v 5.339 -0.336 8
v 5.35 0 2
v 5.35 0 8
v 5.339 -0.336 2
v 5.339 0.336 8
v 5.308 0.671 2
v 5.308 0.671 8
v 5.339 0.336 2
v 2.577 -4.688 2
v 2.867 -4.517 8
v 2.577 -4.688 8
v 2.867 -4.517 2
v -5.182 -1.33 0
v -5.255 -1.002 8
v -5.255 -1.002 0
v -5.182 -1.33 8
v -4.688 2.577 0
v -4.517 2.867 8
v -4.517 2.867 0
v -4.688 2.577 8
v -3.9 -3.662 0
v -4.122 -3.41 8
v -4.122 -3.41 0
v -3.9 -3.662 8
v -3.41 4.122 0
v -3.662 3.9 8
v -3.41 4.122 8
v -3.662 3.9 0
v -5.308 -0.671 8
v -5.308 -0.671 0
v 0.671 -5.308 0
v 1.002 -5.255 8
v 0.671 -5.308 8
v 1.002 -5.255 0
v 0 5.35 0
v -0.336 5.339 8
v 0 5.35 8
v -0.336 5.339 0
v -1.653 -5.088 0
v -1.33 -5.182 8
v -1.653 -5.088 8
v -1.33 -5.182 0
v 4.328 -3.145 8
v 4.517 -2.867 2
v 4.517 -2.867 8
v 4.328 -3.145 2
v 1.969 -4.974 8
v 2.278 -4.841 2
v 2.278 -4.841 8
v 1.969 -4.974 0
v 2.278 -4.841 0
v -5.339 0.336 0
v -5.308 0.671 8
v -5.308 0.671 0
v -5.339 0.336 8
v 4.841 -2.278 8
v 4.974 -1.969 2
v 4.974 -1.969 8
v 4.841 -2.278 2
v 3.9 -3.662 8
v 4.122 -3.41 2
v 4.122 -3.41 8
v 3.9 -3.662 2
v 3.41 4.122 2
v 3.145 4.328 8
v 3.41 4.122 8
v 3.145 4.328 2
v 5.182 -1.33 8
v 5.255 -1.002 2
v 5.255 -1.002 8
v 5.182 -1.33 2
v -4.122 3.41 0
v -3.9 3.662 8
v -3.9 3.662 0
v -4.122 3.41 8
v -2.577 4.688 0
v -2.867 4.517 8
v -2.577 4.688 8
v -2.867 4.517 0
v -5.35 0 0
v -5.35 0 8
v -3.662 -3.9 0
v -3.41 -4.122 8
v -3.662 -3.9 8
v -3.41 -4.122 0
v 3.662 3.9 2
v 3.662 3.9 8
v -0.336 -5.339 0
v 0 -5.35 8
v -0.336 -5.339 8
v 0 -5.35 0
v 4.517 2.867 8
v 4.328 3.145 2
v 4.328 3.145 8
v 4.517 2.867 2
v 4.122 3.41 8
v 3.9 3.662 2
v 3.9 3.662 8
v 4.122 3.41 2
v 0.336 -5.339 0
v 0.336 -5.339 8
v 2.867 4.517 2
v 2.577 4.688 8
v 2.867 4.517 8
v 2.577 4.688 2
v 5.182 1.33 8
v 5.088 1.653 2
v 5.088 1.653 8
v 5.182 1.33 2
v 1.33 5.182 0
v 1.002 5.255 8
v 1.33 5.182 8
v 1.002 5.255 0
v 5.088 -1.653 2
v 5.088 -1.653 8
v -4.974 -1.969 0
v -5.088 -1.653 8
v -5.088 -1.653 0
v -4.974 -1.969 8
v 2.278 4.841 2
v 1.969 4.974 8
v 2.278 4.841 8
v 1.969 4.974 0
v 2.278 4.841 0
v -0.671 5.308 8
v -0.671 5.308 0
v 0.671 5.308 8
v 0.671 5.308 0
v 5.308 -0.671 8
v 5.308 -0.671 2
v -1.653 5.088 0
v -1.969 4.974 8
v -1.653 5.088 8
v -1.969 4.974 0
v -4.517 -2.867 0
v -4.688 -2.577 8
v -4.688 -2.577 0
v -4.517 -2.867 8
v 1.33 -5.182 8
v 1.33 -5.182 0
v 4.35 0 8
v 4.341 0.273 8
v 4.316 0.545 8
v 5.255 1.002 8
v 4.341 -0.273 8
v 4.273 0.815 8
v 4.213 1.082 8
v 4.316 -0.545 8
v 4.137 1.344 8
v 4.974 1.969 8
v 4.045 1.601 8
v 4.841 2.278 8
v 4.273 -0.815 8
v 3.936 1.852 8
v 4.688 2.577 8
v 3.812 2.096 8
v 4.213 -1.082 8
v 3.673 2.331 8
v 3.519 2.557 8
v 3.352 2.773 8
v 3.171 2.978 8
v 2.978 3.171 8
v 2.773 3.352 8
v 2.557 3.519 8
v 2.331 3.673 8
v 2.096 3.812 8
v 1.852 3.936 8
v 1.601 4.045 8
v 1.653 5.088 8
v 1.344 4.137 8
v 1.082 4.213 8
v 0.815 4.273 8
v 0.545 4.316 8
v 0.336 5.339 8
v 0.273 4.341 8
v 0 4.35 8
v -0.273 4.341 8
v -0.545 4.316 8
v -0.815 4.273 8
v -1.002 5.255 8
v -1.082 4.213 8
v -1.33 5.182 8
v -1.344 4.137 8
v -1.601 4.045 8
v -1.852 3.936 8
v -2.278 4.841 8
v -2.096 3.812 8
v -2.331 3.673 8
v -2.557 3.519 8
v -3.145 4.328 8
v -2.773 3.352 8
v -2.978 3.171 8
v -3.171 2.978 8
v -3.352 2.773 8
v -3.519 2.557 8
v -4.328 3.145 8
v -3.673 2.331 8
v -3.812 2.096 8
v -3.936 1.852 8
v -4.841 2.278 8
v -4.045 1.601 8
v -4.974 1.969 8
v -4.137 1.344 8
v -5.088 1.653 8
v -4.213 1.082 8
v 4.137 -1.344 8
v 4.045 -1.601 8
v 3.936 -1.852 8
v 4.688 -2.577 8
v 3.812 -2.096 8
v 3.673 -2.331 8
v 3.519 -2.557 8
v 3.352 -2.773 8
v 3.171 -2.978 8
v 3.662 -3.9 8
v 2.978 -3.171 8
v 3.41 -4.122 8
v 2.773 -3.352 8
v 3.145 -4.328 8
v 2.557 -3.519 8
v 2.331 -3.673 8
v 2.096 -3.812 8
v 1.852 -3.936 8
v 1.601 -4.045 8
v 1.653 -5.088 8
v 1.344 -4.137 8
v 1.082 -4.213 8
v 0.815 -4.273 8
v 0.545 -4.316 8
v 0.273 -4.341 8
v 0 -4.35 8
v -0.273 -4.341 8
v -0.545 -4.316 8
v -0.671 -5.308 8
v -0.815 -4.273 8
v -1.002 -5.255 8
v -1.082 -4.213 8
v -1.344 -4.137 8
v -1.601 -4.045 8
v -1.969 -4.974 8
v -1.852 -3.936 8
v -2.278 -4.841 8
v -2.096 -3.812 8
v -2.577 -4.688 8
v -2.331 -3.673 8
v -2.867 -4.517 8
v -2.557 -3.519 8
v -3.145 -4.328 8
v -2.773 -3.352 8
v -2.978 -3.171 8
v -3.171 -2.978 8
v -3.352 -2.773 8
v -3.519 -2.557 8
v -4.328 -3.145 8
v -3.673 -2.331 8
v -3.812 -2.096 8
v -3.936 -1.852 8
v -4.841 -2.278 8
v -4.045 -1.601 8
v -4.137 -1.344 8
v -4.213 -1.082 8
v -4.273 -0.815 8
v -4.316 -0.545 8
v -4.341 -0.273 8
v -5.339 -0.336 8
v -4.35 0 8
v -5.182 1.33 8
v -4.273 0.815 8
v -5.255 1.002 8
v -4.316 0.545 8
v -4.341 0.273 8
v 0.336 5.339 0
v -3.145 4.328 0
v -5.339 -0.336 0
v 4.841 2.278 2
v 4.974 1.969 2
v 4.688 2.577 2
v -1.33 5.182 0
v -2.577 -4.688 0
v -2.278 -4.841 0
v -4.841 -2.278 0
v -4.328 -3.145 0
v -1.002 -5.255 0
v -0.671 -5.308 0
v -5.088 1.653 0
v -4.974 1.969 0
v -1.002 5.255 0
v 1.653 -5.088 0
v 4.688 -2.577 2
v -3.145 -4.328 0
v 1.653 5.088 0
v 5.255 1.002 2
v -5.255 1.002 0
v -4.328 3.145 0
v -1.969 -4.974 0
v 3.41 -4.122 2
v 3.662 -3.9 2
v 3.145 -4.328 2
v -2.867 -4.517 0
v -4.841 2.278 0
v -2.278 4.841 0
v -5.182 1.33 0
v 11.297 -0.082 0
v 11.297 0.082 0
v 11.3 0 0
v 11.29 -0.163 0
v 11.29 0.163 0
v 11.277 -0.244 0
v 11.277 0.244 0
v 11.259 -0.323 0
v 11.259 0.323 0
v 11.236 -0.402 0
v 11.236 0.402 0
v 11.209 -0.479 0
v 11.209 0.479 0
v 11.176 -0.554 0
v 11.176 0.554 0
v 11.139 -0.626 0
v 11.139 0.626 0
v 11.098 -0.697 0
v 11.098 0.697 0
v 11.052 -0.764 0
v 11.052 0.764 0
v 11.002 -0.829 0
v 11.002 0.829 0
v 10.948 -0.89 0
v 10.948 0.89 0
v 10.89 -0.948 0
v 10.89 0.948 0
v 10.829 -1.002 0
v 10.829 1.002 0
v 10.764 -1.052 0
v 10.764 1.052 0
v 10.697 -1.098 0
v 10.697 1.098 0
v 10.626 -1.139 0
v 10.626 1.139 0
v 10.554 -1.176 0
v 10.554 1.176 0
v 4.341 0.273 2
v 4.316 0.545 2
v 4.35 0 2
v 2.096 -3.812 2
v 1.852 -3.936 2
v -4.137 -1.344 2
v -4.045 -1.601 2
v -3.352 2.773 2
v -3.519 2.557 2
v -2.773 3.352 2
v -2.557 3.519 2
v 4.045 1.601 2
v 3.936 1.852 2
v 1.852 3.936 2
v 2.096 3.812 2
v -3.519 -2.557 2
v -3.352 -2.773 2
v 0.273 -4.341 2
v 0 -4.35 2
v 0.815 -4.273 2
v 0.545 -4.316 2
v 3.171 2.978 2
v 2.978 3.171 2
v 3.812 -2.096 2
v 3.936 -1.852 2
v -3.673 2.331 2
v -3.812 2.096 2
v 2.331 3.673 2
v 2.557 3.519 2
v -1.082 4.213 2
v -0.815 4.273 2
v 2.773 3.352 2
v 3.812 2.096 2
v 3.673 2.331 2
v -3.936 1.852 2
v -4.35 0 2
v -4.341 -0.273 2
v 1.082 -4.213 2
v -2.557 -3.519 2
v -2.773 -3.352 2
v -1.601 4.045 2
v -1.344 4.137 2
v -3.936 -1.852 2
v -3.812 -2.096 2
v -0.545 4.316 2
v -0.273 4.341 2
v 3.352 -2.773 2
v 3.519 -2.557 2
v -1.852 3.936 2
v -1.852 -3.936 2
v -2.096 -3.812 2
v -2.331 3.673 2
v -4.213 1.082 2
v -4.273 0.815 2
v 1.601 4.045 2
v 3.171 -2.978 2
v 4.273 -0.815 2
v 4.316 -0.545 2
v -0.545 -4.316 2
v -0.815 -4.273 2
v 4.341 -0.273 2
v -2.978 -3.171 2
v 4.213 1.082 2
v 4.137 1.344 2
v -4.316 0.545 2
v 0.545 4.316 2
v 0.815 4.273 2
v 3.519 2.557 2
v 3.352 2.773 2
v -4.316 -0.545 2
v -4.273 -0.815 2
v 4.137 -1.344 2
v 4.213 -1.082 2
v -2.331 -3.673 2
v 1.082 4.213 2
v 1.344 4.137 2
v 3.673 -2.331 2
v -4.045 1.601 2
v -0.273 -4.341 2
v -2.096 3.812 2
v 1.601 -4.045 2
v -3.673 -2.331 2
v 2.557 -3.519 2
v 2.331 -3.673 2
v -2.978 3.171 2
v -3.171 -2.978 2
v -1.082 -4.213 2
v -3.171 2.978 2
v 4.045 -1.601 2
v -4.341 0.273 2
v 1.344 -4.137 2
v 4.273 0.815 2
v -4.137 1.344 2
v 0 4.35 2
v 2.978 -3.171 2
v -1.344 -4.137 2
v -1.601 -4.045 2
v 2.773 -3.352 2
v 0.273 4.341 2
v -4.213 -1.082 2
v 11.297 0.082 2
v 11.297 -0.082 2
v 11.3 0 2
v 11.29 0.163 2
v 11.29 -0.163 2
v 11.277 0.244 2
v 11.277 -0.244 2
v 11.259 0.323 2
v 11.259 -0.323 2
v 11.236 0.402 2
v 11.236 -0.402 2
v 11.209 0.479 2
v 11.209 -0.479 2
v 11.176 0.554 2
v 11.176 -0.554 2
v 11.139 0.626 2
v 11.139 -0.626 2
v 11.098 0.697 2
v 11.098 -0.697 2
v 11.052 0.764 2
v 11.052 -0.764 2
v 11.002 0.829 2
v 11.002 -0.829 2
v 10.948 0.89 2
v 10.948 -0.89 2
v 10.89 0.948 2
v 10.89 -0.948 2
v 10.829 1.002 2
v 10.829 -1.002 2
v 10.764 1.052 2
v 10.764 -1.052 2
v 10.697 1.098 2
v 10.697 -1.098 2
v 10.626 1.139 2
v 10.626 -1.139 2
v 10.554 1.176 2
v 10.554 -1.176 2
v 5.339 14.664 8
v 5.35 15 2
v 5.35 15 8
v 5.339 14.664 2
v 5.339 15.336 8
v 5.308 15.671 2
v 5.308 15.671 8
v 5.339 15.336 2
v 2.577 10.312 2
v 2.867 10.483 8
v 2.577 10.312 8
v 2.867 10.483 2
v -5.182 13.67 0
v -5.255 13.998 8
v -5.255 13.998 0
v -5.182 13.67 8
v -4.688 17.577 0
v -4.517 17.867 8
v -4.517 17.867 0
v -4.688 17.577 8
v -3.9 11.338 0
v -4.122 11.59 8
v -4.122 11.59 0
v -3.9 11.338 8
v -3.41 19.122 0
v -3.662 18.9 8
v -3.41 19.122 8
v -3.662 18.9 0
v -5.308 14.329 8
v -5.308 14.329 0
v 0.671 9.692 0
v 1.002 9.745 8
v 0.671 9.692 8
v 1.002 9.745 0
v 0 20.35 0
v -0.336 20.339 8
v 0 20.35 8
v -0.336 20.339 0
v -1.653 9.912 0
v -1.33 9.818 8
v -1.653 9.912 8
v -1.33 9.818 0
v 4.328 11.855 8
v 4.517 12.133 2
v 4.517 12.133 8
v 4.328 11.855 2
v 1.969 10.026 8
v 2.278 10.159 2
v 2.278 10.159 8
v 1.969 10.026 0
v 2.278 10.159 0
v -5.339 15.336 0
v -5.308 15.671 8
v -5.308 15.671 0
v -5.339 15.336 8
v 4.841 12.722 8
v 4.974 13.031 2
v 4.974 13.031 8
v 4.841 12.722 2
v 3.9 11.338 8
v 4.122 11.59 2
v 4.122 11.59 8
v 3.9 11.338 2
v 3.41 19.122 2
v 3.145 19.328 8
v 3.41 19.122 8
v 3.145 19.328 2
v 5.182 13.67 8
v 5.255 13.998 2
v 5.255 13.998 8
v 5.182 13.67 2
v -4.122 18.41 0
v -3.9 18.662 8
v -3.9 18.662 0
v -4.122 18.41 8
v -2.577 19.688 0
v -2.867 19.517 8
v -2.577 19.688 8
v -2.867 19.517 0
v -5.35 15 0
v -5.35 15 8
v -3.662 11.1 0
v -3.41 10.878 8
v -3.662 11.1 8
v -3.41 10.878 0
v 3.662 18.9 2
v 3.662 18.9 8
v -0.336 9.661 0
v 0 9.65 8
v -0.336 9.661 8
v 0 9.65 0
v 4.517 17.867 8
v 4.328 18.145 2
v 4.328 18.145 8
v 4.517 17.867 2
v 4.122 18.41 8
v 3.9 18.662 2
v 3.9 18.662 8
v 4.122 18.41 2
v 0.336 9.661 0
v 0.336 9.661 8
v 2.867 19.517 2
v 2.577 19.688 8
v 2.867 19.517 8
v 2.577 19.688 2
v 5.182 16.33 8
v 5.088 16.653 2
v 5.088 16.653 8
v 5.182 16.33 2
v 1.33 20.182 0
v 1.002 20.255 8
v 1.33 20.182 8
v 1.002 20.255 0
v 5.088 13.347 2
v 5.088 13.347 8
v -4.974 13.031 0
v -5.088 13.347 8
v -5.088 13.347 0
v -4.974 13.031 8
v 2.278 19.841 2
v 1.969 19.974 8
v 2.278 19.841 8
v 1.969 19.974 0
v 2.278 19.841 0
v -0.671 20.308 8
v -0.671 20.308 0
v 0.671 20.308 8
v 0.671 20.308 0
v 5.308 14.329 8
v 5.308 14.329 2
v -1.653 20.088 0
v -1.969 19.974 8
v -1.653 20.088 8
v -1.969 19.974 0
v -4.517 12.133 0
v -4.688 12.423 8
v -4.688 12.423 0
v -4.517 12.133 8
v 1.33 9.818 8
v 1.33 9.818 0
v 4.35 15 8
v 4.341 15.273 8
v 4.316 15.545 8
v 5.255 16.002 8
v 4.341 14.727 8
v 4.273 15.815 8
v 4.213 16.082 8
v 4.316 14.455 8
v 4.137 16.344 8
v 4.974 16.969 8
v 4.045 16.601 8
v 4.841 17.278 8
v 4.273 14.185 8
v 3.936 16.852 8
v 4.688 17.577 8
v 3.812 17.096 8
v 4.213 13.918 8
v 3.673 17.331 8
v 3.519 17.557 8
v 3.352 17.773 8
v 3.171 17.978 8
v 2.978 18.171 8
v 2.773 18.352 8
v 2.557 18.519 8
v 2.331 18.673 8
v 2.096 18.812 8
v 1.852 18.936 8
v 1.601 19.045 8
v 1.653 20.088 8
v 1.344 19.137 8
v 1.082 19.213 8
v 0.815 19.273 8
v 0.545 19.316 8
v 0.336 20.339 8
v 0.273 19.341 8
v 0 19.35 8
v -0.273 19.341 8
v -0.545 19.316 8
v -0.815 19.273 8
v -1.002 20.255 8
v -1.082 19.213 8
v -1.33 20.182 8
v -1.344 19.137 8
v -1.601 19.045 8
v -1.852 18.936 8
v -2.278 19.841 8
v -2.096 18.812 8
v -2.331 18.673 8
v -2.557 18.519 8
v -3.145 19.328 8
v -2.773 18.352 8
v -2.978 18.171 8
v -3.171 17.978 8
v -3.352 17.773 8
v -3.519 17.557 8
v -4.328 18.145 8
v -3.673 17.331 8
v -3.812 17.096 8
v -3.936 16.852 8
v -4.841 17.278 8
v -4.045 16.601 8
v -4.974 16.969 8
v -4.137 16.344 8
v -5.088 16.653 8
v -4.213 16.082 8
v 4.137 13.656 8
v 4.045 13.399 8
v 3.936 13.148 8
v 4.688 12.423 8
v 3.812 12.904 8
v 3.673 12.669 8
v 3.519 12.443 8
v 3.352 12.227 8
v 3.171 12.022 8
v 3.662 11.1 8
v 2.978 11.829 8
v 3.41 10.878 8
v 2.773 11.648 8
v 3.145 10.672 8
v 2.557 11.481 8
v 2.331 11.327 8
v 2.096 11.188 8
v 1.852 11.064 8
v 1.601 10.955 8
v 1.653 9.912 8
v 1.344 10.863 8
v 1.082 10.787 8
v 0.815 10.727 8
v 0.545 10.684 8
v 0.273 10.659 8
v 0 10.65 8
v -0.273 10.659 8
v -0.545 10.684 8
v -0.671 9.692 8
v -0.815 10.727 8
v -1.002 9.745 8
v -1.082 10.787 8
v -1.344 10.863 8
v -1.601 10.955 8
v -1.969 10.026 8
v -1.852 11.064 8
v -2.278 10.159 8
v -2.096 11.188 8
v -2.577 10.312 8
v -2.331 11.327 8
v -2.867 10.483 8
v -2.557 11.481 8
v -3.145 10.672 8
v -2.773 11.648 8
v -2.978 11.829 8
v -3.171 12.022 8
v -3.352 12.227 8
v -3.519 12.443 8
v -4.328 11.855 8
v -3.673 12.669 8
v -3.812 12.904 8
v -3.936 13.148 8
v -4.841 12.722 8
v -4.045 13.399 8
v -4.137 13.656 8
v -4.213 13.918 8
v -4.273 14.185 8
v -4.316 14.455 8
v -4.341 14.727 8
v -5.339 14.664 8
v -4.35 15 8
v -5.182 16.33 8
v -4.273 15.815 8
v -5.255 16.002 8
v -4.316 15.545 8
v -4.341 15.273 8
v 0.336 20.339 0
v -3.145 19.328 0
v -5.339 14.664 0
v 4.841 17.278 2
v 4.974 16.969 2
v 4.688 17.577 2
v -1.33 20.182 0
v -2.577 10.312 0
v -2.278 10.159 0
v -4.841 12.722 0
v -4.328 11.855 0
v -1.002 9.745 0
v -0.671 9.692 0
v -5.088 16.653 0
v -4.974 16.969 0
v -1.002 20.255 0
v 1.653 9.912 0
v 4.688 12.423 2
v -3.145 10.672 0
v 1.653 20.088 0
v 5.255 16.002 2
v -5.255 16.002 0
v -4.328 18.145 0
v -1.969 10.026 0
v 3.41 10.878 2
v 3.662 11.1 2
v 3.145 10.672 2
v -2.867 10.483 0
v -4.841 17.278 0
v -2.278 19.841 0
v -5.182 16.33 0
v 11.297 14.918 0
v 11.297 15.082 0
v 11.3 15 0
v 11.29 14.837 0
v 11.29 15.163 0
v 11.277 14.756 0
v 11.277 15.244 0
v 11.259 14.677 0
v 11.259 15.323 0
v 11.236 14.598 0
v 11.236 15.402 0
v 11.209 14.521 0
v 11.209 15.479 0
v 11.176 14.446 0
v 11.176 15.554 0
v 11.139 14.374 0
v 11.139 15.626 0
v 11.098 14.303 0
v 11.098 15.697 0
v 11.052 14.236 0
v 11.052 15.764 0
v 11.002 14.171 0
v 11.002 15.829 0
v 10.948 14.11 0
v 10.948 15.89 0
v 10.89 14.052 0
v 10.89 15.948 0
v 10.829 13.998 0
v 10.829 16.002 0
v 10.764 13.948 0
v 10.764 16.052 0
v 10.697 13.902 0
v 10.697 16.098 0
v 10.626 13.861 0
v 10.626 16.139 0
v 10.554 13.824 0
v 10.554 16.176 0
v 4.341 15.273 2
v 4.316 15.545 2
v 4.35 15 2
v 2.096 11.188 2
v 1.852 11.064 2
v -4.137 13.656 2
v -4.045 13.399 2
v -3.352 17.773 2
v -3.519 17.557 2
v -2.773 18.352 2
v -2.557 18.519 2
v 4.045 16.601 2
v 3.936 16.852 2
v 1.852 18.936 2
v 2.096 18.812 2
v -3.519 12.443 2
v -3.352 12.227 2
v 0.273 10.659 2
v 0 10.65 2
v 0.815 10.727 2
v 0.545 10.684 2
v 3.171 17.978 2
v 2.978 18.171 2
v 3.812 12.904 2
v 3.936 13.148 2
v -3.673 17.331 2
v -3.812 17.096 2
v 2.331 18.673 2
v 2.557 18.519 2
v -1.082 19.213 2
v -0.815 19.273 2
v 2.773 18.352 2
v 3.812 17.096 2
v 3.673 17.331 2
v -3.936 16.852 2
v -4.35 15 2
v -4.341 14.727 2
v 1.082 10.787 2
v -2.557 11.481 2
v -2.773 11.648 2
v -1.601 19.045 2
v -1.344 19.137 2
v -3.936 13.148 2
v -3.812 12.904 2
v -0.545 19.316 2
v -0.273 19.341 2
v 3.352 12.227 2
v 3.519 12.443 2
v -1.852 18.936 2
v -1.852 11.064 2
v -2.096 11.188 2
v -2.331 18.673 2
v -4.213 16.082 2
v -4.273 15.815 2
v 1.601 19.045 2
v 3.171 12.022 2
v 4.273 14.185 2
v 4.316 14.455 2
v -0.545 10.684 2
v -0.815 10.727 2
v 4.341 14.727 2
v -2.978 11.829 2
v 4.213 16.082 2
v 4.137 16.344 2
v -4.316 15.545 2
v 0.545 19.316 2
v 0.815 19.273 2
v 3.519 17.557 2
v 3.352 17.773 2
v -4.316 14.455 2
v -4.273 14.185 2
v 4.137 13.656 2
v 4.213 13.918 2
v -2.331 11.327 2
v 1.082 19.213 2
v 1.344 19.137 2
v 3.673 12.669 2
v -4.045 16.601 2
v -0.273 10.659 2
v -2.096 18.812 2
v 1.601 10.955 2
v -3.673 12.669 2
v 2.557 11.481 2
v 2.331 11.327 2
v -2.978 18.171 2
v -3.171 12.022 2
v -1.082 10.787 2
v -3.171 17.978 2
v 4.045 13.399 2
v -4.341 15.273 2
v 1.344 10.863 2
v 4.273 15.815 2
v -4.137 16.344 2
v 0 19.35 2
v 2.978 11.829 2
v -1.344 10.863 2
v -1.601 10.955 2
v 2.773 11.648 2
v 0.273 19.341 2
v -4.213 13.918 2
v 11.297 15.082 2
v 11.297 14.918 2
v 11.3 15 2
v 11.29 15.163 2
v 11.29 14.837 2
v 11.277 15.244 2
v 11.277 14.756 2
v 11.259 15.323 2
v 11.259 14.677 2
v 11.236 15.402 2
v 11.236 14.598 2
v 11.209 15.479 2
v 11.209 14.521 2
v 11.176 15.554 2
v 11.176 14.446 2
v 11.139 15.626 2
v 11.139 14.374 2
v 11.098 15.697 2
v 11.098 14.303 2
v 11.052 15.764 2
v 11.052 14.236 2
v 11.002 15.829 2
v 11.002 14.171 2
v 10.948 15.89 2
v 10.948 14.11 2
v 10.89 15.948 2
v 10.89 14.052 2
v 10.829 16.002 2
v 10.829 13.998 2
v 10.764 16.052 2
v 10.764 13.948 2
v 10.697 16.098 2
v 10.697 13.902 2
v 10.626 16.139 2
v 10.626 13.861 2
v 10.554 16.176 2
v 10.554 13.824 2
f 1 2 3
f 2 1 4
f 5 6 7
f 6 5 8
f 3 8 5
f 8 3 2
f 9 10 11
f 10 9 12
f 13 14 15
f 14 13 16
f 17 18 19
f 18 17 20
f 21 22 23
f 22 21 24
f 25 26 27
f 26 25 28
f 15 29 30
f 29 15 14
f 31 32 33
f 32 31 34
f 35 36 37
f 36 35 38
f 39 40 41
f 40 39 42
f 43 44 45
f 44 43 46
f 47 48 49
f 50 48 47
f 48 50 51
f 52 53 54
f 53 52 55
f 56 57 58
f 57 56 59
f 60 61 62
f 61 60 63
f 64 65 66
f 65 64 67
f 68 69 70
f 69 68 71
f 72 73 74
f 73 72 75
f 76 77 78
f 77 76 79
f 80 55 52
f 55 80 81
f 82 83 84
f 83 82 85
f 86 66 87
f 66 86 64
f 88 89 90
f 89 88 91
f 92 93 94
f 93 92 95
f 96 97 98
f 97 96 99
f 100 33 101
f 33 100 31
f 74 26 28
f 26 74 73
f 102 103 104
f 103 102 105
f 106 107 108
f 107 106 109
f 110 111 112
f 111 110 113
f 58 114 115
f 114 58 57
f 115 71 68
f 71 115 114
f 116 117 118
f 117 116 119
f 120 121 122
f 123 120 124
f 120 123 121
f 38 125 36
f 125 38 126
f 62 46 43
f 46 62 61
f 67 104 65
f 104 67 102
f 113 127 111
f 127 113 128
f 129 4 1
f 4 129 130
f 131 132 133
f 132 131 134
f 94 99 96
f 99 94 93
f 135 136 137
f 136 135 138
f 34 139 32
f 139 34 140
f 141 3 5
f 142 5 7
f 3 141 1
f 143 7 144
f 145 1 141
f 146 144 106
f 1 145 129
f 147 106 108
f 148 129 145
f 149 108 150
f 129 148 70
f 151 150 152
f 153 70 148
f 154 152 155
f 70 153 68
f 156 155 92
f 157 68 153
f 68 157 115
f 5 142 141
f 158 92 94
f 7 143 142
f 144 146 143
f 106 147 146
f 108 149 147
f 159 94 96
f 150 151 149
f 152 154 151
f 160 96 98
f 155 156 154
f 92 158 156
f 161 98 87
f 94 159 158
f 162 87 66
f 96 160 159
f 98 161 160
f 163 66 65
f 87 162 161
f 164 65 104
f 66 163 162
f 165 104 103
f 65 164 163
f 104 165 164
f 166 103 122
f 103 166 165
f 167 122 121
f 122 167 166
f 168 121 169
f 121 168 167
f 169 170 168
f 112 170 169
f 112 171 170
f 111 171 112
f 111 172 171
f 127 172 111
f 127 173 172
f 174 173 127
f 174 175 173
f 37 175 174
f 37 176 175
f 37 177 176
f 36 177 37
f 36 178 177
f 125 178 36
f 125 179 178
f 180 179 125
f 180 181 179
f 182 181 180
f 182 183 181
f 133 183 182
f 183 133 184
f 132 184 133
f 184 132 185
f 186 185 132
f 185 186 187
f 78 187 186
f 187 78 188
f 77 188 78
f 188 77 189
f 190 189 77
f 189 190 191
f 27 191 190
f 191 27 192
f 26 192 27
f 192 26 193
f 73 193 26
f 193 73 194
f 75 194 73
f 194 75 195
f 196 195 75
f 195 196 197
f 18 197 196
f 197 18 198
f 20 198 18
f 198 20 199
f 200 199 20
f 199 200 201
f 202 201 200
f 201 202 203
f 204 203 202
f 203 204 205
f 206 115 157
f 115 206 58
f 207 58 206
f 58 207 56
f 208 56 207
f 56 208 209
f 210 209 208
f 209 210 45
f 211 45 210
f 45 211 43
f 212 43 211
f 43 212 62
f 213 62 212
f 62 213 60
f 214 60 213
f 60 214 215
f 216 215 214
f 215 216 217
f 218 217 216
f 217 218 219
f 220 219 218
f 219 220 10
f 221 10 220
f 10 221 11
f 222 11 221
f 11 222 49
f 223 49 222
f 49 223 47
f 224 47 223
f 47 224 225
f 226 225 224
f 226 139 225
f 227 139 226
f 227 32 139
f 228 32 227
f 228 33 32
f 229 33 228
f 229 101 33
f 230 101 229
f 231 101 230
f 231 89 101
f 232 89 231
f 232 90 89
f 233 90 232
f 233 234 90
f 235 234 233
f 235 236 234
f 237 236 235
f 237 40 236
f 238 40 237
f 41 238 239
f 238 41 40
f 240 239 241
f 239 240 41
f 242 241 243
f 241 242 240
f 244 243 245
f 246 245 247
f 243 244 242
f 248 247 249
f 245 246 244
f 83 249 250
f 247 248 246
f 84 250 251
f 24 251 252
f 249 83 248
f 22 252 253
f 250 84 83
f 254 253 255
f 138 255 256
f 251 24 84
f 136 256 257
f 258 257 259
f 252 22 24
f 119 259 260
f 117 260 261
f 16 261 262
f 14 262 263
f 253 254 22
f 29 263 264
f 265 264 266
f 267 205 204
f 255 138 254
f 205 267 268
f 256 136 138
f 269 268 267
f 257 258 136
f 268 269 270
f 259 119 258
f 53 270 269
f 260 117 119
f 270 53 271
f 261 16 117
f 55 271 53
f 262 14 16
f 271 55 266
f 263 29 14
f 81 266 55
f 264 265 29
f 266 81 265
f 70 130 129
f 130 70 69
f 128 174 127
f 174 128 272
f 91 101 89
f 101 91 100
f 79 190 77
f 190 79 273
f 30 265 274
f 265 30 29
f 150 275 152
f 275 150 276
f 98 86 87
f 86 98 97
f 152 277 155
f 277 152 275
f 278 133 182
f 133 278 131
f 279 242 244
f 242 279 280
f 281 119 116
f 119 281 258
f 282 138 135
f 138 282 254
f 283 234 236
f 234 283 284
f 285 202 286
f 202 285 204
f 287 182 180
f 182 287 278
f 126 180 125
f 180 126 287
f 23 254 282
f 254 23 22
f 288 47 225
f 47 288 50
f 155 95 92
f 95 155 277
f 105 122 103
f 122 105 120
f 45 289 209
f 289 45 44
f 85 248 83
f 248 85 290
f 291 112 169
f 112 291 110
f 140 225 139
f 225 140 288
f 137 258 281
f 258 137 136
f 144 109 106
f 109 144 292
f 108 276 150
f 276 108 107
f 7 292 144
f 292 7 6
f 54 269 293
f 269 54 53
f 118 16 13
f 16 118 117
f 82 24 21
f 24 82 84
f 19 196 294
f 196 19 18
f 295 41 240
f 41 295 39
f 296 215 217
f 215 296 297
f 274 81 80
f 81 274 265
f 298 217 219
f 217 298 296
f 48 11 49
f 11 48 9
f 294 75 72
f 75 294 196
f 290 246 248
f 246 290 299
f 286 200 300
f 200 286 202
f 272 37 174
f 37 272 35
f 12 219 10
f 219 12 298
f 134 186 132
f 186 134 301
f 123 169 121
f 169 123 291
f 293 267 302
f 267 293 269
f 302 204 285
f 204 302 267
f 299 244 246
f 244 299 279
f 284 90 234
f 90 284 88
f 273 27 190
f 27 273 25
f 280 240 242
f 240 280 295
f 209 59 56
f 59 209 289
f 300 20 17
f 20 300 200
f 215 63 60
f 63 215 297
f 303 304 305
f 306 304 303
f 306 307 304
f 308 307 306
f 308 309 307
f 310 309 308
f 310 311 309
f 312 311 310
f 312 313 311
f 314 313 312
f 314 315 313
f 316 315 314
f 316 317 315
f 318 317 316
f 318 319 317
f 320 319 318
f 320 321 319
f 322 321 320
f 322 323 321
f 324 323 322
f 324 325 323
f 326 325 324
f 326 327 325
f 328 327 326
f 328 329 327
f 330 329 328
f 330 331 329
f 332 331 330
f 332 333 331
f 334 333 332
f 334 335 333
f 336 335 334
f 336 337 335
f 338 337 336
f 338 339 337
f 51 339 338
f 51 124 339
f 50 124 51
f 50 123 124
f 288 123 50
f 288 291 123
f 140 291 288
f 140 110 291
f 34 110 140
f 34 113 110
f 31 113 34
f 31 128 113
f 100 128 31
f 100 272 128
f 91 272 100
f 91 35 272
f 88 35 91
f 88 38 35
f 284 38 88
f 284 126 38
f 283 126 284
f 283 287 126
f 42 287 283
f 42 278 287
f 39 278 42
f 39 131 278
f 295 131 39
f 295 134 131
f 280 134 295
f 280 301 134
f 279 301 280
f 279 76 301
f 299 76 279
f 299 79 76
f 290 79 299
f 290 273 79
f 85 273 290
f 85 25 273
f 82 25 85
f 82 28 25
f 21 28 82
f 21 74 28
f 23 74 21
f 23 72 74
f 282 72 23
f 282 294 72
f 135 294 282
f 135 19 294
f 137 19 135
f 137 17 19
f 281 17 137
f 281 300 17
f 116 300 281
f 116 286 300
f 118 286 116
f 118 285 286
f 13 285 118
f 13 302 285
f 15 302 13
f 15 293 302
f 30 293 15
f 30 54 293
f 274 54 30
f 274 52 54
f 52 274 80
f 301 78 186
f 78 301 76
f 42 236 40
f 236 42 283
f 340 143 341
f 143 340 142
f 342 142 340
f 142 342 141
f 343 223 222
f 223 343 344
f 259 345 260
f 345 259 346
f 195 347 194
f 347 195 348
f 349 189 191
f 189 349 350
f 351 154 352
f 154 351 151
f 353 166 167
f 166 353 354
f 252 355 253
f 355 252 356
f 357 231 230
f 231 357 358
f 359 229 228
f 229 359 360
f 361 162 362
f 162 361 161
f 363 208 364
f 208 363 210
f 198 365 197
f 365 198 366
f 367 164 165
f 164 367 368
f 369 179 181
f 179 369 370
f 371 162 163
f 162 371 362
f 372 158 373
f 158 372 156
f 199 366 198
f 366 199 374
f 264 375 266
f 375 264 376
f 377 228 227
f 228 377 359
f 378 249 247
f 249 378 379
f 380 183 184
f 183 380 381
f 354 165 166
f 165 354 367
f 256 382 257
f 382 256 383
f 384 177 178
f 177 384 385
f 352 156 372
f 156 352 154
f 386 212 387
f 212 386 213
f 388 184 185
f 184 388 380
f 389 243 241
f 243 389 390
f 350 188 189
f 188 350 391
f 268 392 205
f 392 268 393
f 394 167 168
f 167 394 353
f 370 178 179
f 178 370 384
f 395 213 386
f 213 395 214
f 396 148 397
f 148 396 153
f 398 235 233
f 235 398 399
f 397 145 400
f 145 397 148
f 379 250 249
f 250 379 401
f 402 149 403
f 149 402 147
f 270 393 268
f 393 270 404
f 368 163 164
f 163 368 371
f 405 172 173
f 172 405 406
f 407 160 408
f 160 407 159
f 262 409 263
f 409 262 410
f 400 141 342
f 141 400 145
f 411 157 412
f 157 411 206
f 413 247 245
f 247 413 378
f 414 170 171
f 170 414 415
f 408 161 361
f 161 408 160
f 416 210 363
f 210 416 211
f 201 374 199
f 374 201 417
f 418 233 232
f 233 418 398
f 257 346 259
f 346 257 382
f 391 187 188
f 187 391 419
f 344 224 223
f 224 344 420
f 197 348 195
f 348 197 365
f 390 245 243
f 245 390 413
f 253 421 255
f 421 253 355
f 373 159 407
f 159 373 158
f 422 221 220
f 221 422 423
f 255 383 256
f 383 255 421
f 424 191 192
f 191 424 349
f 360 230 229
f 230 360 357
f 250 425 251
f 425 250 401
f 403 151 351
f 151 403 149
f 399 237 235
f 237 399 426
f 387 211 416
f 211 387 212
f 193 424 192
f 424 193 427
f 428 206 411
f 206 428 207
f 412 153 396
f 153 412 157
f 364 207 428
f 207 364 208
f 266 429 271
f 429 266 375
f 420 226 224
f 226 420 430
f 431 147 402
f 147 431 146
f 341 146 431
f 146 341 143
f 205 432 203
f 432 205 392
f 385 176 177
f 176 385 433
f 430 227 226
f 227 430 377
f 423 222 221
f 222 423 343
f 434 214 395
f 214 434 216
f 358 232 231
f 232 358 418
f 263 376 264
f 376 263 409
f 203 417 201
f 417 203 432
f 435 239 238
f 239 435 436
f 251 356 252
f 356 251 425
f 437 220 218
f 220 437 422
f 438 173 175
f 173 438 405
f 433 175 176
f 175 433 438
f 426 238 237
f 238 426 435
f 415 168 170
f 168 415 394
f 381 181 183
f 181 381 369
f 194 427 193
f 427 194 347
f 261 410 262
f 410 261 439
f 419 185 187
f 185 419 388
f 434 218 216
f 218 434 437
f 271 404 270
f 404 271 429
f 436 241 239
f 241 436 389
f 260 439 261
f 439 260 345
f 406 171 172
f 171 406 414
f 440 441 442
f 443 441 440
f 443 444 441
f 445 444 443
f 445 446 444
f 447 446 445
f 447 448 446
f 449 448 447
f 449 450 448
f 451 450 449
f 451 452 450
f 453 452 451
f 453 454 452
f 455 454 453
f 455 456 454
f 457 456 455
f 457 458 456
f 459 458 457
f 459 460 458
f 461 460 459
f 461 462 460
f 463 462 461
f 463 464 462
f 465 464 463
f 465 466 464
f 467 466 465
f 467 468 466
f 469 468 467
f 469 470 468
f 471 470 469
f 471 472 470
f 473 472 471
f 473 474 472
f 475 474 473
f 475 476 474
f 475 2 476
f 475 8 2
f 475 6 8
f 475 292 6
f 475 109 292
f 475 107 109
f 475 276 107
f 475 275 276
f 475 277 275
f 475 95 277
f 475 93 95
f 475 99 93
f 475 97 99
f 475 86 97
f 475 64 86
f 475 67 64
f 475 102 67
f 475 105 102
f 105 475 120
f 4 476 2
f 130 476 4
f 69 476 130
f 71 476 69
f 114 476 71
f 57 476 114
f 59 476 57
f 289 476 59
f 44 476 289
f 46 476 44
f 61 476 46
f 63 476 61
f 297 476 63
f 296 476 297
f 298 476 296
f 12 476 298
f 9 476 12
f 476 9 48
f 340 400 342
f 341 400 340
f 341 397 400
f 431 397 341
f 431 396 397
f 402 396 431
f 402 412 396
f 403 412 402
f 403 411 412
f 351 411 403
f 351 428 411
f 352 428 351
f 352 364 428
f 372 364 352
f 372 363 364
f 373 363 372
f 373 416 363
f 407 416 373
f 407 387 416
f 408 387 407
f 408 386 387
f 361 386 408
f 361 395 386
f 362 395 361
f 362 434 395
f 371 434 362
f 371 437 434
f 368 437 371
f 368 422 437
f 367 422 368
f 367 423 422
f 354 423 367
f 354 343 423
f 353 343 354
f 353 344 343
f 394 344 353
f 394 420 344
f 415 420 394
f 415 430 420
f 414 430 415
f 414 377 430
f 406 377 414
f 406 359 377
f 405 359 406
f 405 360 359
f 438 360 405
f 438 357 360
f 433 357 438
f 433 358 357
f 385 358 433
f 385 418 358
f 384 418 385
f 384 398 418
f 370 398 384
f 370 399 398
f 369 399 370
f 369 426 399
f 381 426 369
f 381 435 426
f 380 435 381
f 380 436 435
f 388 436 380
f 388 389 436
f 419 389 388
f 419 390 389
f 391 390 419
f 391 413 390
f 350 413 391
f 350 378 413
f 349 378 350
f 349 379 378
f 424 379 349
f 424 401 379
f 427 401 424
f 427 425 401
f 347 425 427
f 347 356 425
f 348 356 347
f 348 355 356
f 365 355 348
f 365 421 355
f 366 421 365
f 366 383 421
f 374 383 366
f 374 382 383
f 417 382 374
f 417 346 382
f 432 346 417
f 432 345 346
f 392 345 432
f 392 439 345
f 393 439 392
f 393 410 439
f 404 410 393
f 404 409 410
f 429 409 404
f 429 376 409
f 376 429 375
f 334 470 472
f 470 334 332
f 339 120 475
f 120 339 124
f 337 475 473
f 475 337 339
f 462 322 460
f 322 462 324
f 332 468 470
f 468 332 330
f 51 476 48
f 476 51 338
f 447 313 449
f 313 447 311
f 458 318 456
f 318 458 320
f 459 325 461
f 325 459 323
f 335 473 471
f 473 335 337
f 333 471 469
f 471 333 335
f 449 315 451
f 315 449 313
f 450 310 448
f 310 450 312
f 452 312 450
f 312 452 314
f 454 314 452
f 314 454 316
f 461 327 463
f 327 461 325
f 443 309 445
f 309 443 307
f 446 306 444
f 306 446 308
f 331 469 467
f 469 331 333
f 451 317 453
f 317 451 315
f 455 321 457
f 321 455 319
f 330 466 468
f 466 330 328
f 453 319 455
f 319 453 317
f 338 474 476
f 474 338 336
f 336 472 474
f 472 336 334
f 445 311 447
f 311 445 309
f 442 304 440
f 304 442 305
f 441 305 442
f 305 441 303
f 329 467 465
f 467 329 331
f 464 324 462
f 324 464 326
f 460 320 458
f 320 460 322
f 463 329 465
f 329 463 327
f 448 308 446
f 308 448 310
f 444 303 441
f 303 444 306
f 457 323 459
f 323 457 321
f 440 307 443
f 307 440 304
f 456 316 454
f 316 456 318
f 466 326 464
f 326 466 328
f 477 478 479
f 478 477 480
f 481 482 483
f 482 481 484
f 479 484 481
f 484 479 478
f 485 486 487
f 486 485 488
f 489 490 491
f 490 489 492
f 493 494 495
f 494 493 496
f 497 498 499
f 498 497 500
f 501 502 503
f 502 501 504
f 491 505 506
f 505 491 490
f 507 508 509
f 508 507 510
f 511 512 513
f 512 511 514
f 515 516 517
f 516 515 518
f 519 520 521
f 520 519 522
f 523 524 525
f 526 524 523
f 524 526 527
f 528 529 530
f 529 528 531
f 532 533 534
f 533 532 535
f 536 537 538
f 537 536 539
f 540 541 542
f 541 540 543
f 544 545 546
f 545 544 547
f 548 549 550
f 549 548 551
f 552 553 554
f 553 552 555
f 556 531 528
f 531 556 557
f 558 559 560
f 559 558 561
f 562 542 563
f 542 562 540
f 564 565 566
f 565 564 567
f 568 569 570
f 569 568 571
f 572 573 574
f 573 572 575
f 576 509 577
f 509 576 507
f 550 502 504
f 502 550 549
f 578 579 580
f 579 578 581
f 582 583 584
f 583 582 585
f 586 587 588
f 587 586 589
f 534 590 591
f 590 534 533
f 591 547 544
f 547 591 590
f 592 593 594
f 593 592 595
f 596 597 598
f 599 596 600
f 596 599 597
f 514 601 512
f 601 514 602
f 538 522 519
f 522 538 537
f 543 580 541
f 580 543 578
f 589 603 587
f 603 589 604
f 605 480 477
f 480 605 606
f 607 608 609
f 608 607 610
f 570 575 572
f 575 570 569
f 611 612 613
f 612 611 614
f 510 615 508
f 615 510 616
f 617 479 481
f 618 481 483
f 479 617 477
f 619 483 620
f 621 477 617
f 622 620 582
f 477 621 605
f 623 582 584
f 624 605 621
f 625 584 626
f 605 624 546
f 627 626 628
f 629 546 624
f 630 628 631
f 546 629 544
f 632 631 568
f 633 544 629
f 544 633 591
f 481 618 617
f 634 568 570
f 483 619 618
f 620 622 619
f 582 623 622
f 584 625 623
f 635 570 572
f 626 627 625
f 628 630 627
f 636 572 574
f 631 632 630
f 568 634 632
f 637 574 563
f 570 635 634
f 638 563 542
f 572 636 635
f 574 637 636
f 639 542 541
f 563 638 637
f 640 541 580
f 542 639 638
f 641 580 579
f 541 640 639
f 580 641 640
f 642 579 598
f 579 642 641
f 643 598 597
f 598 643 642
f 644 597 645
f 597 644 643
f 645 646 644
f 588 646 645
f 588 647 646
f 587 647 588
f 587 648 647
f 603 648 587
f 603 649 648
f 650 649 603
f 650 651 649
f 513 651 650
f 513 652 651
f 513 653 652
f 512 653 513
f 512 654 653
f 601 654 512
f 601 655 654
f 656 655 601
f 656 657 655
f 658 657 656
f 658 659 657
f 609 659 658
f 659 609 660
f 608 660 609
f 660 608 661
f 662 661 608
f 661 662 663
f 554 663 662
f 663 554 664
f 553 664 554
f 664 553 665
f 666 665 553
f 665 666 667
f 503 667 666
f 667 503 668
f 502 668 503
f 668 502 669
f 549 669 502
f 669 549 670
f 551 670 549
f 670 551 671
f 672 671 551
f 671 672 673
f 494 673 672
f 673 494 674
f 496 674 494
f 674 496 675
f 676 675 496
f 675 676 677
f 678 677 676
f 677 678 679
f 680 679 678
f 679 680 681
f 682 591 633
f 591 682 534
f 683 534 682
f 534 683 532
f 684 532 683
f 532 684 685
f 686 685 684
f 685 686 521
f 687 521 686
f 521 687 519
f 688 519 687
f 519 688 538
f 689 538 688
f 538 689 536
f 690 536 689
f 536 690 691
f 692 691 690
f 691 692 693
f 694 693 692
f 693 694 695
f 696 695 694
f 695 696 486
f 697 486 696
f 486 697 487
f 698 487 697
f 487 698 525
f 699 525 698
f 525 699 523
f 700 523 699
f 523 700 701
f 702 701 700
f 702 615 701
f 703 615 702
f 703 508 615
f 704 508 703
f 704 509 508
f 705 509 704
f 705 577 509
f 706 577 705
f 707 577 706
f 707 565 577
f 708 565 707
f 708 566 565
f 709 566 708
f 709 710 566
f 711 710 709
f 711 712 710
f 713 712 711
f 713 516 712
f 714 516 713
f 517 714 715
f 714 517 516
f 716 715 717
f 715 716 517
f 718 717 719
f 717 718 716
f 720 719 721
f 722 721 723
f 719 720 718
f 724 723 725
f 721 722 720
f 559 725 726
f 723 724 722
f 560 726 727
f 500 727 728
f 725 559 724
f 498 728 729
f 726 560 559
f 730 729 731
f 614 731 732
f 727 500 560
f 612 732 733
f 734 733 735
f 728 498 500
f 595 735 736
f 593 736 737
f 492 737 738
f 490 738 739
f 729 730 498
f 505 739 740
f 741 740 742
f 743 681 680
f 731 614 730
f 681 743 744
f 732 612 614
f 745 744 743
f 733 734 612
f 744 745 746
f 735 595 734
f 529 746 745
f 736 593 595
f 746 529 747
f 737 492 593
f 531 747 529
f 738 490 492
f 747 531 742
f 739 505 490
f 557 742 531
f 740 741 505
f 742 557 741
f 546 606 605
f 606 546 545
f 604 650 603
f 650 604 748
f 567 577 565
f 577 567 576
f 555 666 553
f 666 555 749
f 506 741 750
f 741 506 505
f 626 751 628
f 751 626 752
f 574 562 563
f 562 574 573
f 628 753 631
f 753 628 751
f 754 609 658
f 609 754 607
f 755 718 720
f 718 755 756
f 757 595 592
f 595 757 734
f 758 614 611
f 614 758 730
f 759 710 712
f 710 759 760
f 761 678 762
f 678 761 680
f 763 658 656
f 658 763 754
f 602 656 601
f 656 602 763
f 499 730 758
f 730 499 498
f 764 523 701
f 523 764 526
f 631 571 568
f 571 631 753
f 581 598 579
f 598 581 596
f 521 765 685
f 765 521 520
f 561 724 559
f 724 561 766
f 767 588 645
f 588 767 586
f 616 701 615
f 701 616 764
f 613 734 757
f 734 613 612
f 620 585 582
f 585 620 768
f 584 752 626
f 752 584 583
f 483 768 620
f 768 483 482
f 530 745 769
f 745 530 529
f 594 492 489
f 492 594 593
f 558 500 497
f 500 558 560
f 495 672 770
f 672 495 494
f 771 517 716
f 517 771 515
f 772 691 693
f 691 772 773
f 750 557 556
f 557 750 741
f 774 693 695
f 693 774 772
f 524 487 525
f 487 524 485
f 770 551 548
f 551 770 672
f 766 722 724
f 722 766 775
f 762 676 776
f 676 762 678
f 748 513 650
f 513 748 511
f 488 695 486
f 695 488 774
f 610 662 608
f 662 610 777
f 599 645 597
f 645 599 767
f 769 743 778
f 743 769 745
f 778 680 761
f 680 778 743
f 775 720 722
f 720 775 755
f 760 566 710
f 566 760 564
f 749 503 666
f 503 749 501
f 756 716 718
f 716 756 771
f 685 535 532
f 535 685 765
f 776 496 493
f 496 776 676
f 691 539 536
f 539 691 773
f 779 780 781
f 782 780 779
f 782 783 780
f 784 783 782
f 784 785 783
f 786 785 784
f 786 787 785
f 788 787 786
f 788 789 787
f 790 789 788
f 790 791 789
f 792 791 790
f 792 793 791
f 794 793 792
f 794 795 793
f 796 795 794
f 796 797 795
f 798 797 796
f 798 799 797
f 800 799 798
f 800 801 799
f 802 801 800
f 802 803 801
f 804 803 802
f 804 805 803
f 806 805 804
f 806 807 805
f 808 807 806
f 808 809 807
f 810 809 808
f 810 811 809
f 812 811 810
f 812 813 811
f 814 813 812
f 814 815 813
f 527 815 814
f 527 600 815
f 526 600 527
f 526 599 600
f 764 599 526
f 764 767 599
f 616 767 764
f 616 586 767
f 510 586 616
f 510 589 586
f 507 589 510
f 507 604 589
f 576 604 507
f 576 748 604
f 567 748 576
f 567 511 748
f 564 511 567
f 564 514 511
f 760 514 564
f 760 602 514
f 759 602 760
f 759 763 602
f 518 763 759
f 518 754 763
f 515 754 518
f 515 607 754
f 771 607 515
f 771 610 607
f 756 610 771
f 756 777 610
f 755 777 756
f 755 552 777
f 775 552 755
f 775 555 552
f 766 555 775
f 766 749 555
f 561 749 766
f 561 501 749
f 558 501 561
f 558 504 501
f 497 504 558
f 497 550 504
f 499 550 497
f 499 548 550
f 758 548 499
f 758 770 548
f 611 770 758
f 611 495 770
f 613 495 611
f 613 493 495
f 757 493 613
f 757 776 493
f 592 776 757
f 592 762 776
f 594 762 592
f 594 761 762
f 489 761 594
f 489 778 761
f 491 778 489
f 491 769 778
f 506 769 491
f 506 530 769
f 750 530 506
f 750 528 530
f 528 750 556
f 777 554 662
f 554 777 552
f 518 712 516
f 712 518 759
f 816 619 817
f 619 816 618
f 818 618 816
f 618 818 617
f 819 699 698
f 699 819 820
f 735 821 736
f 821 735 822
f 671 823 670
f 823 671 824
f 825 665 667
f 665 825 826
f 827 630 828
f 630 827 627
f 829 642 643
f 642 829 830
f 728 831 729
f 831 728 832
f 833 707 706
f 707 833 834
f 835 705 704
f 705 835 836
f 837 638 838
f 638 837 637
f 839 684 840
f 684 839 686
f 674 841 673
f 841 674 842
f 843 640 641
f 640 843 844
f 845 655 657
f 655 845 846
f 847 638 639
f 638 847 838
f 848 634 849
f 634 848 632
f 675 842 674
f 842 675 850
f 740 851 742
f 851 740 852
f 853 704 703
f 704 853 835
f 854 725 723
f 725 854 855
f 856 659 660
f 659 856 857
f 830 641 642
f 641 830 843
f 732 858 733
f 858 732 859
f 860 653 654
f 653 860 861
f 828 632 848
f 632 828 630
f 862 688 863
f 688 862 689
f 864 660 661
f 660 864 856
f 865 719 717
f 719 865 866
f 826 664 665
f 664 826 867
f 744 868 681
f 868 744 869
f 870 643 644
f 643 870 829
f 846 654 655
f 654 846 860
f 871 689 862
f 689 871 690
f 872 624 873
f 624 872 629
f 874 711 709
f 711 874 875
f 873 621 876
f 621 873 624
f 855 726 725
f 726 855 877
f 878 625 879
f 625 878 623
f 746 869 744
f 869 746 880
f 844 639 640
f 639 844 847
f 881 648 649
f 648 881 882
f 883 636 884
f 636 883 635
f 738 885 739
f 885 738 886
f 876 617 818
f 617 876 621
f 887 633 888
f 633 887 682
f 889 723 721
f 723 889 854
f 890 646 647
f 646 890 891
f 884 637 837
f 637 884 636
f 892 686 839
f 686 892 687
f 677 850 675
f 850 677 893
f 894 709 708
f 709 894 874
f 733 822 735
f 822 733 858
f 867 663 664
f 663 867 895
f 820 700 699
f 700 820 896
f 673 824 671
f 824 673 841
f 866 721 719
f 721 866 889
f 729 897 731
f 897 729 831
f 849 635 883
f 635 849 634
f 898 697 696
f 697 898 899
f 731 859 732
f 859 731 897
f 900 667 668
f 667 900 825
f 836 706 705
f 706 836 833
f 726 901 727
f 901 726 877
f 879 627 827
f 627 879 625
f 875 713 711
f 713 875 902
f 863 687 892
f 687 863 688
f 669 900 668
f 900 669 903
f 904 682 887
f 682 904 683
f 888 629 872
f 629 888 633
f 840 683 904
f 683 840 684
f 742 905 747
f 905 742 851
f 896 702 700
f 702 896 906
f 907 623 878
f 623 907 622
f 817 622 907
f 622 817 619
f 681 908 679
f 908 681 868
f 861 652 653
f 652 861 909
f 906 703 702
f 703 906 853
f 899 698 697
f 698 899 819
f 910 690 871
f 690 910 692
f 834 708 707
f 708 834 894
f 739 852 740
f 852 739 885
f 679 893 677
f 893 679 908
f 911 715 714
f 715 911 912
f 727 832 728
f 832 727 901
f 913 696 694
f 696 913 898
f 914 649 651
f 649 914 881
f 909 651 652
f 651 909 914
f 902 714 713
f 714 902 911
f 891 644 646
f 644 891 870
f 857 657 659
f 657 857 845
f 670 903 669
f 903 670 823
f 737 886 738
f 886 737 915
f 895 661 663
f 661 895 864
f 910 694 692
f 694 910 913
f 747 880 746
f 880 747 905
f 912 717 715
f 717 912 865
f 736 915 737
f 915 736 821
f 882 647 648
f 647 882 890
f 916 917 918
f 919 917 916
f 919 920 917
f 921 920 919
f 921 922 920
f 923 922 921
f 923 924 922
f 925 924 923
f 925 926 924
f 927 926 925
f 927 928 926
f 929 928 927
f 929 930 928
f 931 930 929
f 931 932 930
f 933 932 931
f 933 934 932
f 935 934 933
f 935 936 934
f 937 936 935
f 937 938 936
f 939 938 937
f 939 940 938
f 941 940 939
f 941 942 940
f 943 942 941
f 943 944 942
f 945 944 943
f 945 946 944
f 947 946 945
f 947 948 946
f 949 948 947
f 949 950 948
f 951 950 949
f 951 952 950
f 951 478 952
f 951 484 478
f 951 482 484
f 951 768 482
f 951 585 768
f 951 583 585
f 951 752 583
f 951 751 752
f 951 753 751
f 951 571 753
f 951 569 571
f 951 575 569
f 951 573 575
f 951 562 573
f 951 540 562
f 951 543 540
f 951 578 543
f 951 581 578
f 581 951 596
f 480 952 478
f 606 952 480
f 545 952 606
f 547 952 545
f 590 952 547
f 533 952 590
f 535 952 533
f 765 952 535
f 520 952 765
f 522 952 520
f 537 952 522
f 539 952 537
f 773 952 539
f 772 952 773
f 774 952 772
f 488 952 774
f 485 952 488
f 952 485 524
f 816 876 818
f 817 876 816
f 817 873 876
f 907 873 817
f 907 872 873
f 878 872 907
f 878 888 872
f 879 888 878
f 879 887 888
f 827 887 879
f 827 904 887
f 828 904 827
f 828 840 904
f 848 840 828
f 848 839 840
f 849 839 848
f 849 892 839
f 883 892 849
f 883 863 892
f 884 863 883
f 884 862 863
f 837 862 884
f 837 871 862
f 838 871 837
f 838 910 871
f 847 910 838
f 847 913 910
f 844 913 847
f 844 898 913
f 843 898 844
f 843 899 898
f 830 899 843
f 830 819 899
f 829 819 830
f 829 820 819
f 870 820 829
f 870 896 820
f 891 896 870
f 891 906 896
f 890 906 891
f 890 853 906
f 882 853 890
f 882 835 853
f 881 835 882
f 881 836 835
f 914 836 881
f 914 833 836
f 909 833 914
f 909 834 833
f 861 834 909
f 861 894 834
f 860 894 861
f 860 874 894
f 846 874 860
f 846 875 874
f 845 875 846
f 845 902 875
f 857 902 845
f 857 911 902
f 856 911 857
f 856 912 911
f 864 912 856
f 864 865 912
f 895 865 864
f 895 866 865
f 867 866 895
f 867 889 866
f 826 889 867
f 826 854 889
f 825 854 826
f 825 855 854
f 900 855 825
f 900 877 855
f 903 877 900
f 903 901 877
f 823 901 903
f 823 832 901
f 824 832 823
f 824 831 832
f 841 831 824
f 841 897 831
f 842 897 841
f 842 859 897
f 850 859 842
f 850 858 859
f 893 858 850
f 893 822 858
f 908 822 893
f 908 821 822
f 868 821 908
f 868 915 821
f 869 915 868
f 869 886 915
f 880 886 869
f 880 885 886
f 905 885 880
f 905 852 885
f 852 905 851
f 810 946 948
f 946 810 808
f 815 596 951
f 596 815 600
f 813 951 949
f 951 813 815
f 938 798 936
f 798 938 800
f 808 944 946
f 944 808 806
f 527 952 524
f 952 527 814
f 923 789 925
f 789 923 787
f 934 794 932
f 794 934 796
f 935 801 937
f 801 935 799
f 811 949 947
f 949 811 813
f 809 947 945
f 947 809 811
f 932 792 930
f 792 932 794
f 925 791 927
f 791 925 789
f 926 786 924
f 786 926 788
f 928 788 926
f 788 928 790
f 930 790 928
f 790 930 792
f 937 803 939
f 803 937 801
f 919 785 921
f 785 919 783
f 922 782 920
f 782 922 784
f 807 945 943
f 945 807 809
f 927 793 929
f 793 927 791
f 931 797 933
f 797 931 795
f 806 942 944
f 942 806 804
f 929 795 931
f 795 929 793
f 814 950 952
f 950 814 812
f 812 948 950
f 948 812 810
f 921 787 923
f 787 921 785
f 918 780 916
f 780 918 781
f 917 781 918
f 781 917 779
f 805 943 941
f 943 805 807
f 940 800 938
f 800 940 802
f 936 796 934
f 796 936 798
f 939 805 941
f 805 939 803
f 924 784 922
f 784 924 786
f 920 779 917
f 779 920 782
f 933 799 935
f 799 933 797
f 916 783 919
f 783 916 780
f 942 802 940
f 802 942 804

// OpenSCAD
// file: inc/screwsizes.scad
/////////////////////////////////////////////////////////////////////////////////
// screwsizes.scad - has the screw sizes I use
/////////////////////////////////////////////////////////////////////////////////
// created 7/13/2016
// last update 7/20/16
/////////////////////////////////////////////////////////////////////////////////
screw2 = 2.6;
screw3 = 3.5;
screw3t = 2.6;
screw3hd = 6.5;
screw4 = 4.5;
screw4t = 3.5;
screw4hd = 7.5;
screw5 = 5.7;
screw5t = 4.5;
screw5hd = 11;
screw8 = 8.7;
nut5 = 9.5;
//////////////////////////////////////////////////////////////////////////////////
// main file
///////////////////////////////////////////////////////////////////////
// leadscrewtop.scad
////////////////////////////////////////////////////////////////////////
// created 9/4/16
// last upate 9/4/16
////////////////////////////////////////////////////////////////////////
include <inc/screwsizes.scad>
////////////////////////////////////////////////////////////////////////
$fn=100;

top();
translate([0,15,0]) top();

//////////////////////////////////////////////////////////////////////////

module top() {
	difference() {
		cylinder(h=8,d=screw8+2);
		translate([0,0,2]) cylinder(h=8,d=screw8);
	}
	hull() {
		cylinder(h=2,d=screw8+2);
		translate([10,0,0]) cylinder(h=2,d=screw2);
	}
}

///////////////////////// end of leadscrewtop.scad //////////////////////
